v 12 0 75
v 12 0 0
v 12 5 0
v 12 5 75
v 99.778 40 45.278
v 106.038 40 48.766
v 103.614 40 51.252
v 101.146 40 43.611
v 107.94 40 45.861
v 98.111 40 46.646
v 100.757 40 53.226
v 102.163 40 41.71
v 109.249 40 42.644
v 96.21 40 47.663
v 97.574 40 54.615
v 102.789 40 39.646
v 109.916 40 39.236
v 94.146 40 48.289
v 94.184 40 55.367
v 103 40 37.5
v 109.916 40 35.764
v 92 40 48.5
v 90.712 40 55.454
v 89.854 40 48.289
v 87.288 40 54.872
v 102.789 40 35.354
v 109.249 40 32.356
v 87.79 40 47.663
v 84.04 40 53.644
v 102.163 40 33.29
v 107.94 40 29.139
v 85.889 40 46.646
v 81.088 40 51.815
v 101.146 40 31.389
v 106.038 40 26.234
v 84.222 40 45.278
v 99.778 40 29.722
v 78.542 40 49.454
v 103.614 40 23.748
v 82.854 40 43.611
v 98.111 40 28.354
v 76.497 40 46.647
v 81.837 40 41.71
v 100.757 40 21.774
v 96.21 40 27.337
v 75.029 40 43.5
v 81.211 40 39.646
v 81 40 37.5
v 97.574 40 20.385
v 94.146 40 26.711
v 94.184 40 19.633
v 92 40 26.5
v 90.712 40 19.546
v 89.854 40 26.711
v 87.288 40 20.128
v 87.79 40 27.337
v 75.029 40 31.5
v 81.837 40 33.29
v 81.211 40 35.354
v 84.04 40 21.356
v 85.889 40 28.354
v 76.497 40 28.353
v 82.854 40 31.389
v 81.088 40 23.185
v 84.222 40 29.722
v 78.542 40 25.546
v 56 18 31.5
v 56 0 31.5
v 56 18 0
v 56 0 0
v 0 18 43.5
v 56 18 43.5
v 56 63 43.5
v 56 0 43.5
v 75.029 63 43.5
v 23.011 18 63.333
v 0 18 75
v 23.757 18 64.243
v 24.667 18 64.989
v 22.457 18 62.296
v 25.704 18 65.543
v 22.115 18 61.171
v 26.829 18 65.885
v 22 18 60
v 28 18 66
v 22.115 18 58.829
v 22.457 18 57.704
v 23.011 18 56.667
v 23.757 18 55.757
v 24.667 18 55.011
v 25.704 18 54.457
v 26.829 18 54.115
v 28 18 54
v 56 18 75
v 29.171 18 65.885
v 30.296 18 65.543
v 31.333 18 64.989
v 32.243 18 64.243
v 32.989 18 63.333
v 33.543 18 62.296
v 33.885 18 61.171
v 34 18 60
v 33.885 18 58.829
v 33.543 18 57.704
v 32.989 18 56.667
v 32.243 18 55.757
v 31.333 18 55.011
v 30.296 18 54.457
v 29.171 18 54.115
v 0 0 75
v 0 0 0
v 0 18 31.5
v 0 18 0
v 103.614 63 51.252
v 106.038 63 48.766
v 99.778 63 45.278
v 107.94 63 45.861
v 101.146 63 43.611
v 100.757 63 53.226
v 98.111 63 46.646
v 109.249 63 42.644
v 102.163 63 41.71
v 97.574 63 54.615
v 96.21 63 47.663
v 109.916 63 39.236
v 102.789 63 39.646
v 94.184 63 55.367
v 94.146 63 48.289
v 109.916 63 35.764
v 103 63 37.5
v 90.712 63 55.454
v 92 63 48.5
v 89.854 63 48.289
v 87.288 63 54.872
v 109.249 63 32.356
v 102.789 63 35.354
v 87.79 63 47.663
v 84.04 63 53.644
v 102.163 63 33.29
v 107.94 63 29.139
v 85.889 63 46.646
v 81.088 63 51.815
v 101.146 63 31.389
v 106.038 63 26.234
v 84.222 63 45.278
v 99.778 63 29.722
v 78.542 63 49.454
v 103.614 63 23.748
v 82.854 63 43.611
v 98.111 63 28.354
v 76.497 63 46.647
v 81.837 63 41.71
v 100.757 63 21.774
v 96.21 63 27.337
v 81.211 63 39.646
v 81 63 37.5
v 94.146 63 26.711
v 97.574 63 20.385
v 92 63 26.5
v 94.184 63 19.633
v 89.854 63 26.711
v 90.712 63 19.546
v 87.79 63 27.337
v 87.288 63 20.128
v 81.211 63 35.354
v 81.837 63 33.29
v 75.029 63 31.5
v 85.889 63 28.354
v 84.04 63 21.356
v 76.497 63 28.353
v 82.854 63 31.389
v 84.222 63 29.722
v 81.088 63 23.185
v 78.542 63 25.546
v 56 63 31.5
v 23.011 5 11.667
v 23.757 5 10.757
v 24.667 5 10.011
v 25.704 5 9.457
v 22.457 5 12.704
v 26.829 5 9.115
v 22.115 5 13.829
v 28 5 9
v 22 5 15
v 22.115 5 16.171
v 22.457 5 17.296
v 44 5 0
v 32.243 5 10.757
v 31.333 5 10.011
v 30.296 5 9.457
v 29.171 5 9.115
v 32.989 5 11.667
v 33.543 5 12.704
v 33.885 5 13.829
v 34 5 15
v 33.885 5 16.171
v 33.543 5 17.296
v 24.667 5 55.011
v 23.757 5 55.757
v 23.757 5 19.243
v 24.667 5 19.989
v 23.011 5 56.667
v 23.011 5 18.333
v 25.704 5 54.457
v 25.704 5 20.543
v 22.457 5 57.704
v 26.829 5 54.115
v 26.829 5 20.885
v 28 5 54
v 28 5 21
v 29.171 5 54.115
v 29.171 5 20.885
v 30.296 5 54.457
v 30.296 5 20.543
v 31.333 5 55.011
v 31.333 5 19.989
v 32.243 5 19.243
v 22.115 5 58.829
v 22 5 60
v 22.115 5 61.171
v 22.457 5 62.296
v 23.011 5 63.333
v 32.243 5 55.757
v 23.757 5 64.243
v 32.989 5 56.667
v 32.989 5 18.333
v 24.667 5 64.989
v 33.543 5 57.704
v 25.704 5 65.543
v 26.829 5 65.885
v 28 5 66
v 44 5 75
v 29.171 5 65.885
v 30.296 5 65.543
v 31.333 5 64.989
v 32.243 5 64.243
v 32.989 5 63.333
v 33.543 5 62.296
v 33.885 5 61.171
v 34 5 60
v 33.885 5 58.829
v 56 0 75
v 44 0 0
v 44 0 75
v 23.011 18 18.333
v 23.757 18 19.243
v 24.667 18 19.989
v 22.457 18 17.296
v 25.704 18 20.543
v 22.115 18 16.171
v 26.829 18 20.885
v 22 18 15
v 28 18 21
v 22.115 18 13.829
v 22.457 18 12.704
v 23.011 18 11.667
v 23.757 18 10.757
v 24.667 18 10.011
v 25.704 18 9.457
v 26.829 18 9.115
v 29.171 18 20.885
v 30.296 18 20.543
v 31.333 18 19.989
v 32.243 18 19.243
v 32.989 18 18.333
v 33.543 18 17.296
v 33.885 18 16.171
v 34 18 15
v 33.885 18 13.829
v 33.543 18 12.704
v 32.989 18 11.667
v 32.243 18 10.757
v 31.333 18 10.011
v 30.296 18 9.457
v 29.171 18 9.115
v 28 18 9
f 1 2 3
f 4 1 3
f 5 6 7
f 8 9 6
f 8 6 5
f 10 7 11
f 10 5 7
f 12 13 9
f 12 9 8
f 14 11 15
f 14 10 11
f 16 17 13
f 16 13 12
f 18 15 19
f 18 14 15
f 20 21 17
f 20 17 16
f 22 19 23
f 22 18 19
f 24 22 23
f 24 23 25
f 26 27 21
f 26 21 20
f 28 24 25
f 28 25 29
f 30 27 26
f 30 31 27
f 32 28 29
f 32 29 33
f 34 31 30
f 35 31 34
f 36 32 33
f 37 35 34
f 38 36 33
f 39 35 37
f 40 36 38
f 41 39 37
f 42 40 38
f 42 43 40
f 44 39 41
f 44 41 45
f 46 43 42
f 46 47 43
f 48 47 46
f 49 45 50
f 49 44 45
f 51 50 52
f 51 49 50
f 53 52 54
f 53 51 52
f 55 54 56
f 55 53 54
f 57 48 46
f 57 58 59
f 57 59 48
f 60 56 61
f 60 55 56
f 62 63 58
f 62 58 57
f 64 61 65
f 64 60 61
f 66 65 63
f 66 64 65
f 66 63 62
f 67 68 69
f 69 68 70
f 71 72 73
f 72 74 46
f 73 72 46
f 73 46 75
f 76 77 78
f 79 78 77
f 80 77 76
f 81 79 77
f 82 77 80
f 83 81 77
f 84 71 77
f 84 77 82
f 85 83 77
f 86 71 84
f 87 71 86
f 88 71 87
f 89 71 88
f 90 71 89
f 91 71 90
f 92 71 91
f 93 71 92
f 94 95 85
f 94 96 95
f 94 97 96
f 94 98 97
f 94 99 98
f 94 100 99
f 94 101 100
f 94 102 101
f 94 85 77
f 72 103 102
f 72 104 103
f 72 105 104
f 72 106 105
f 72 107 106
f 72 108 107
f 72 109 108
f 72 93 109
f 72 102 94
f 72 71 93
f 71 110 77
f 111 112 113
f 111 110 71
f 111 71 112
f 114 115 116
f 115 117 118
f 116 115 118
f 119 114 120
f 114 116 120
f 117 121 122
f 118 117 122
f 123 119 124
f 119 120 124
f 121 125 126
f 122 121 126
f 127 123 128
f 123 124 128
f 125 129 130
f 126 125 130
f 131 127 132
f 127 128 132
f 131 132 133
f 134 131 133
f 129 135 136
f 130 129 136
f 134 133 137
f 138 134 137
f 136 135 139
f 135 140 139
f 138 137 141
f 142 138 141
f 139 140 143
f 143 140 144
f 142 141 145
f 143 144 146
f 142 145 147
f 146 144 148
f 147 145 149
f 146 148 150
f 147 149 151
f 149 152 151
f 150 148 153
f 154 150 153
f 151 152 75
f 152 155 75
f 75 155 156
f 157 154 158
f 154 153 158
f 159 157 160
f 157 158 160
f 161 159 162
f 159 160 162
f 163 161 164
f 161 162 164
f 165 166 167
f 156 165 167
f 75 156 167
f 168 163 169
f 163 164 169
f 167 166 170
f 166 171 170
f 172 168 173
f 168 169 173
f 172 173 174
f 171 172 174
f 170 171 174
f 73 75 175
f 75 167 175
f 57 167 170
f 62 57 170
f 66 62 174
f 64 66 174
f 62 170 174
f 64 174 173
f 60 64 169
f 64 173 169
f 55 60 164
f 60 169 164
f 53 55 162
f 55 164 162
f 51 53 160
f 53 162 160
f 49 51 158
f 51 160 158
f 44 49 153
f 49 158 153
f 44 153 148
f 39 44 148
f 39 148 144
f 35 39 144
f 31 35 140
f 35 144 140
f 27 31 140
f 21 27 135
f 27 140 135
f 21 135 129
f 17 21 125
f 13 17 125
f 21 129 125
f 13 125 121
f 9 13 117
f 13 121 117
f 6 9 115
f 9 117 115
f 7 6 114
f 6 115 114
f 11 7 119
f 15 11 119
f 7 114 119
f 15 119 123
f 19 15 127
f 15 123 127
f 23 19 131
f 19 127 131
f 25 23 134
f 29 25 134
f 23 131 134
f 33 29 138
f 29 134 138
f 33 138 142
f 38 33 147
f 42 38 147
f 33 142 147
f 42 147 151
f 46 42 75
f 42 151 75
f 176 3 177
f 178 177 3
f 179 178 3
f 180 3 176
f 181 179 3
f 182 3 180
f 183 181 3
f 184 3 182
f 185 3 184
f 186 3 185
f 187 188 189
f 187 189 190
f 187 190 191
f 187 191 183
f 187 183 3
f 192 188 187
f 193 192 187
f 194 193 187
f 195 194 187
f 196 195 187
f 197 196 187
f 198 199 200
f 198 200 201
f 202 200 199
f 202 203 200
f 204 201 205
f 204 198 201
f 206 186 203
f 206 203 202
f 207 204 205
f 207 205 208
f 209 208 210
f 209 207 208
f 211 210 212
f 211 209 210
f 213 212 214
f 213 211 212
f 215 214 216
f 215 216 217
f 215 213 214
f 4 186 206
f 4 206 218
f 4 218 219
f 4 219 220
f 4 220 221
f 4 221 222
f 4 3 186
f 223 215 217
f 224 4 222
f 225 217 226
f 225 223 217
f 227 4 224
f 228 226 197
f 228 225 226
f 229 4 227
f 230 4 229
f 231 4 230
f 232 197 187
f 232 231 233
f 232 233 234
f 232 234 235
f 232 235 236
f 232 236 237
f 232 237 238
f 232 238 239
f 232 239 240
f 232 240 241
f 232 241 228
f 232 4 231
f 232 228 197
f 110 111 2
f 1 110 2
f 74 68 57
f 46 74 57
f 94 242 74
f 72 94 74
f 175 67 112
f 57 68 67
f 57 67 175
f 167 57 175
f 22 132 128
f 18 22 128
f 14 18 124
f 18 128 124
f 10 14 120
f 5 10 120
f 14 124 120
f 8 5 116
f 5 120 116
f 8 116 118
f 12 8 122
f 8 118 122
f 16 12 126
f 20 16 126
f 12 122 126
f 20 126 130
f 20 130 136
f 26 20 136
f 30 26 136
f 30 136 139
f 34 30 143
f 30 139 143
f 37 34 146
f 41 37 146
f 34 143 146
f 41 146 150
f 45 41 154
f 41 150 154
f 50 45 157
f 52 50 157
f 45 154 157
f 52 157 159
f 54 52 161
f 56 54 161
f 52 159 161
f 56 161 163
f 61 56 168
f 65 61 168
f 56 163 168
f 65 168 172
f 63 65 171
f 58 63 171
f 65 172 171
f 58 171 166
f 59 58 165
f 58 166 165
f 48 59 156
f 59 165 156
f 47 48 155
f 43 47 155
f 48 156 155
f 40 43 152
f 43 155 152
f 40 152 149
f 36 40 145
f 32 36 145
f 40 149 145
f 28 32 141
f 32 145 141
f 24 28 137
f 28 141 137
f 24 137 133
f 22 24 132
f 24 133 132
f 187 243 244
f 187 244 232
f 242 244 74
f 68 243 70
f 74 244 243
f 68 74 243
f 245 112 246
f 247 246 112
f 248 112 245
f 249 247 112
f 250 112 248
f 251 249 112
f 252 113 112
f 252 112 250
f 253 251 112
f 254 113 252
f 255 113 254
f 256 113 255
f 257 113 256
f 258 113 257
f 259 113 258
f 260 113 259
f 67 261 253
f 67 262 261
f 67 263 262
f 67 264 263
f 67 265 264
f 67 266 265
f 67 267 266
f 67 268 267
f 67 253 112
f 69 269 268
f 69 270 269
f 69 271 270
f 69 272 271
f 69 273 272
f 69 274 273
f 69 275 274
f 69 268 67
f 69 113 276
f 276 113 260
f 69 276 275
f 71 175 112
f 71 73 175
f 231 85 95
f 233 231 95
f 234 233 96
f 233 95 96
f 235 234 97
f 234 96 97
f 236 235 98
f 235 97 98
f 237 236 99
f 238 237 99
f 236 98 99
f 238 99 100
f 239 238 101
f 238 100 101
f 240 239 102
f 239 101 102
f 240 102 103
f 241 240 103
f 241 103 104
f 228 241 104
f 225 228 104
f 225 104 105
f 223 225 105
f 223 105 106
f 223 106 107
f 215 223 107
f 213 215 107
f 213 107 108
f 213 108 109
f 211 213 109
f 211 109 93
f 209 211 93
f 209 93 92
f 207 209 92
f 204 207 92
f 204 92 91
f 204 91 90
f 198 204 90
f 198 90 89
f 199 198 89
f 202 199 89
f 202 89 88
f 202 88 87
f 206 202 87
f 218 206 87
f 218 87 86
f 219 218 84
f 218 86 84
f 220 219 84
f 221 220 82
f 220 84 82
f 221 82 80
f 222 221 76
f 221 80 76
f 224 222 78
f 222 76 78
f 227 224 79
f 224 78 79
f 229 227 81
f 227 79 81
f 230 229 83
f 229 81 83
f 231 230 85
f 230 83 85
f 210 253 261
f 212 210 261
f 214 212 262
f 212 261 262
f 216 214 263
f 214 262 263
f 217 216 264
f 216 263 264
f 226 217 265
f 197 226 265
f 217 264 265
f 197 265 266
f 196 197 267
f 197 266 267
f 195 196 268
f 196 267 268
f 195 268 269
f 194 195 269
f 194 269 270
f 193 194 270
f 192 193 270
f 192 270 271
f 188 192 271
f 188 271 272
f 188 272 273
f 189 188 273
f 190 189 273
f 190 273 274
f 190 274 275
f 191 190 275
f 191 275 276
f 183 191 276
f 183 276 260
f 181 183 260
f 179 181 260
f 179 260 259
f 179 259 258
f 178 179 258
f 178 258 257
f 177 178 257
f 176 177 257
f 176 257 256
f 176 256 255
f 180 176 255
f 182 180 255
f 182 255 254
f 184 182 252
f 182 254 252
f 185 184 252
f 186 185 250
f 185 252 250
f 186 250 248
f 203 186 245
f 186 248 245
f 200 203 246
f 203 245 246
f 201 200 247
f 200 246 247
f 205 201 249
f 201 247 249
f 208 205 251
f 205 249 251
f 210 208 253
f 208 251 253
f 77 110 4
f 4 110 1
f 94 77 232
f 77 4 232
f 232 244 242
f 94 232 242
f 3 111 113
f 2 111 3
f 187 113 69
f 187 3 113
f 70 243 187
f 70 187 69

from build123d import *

# Parameters (mm, degrees)
IZIM1_W                     = 56
IZIM1_H                     = 75
Y_KSEKLIK_EKSTR_ZYON1_DEPTH = 18
IZIM3_R                     = 6
KES_EKSTR_ZYON1_DEPTH       = 96.315266353
IZIM4_W                     = 32
IZIM4_H                     = 5
KES_EKSTR_ZYON2_DEPTH       = 96.315266353
Y_KSEKLIK_EKSTR_ZYON2_DEPTH = 6
IZIM7_R                     = 11
Y_KSEKLIK_EKSTR_ZYON3_DEPTH = 23
FEDER1_REACH                = 134.194
IZIM8_WALL_W                = 310.68379038
IZIM8_WALL_H                = 12


with BuildPart() as part:
    # Çizim1 → Yükseklik-Ekstrüzyon1 (new body)
    with BuildSketch(Plane(origin=(0, 0, 0), x_dir=(1, 0, 0), z_dir=(0, 1, 0))):
        with Locations((28, -37.5)):
            Rectangle(IZIM1_W, IZIM1_H)
    extrude(amount=Y_KSEKLIK_EKSTR_ZYON1_DEPTH)

    # Çizim3 → Kes-Ekstrüzyon1 (cut, through all)
    with BuildSketch(Plane(origin=(0, 18, 0), x_dir=(1, 0, 0), z_dir=(0, 1, 0))):
        with Locations(Location((28, -15, 0), (0, 0, 270))):
            Circle(IZIM3_R)
        with Locations(Location((28, -60, 0), (0, 0, 270))):
            Circle(IZIM3_R)
    extrude(amount=-KES_EKSTR_ZYON1_DEPTH, mode=Mode.SUBTRACT)

    # Çizim4 → Kes-Ekstrüzyon2 (cut, through all)
    with BuildSketch(Plane.XY.offset(75)):
        with Locations((28, 2.5)):
            Rectangle(IZIM4_W, IZIM4_H)
    extrude(amount=-KES_EKSTR_ZYON2_DEPTH, mode=Mode.SUBTRACT)

    # Çizim5 → Yükseklik-Ekstrüzyon2 (add, symmetric)
    with BuildSketch(Plane.XY.offset(37.5)):
        Polygon((0, 18), (56, 18), (56, 63), align=None)
    extrude(amount=Y_KSEKLIK_EKSTR_ZYON2_DEPTH, both=True)

    # Çizim7 → Yükseklik-Ekstrüzyon3 (add)
    with BuildSketch(Plane(origin=(0, 63, 0), x_dir=(1, 0, 0), z_dir=(0, 1, 0))):
        with BuildLine():
            Line((56, -31.5), (75.029437252, -31.5))
            ThreePointArc((75.029437252, -31.5), (110, -37.5), (75.029437252, -43.5))
            Line((75.029437252, -43.5), (56, -43.5))
            Line((56, -43.5), (56, -37.5))
            Line((56, -37.5), (56, -31.5))
        make_face()
        with Locations(Location((92, -37.5, 0), (0, 0, 270))):
            Circle(IZIM7_R, mode=Mode.SUBTRACT)
    extrude(amount=-Y_KSEKLIK_EKSTR_ZYON3_DEPTH)

    # Çizim8 wall → Feder1 (add, up to next)
    with BuildSketch(Plane(origin=(65.514718626, 20, 37.5), x_dir=(0.42959895901, 0.903019786283, 0), z_dir=(-0.903019786283, 0.42959895901, 0)), mode=Mode.PRIVATE) as feder1_sk1:
        Rectangle(IZIM8_WALL_W, IZIM8_WALL_H)
    feder1_tool1 = extrude(feder1_sk1.sketch, amount=FEDER1_REACH, mode=Mode.PRIVATE) - part.part
    add(feder1_tool1.solids().sort_by_distance((65.514718626, 20, 37.5))[0])


solid = part.part
